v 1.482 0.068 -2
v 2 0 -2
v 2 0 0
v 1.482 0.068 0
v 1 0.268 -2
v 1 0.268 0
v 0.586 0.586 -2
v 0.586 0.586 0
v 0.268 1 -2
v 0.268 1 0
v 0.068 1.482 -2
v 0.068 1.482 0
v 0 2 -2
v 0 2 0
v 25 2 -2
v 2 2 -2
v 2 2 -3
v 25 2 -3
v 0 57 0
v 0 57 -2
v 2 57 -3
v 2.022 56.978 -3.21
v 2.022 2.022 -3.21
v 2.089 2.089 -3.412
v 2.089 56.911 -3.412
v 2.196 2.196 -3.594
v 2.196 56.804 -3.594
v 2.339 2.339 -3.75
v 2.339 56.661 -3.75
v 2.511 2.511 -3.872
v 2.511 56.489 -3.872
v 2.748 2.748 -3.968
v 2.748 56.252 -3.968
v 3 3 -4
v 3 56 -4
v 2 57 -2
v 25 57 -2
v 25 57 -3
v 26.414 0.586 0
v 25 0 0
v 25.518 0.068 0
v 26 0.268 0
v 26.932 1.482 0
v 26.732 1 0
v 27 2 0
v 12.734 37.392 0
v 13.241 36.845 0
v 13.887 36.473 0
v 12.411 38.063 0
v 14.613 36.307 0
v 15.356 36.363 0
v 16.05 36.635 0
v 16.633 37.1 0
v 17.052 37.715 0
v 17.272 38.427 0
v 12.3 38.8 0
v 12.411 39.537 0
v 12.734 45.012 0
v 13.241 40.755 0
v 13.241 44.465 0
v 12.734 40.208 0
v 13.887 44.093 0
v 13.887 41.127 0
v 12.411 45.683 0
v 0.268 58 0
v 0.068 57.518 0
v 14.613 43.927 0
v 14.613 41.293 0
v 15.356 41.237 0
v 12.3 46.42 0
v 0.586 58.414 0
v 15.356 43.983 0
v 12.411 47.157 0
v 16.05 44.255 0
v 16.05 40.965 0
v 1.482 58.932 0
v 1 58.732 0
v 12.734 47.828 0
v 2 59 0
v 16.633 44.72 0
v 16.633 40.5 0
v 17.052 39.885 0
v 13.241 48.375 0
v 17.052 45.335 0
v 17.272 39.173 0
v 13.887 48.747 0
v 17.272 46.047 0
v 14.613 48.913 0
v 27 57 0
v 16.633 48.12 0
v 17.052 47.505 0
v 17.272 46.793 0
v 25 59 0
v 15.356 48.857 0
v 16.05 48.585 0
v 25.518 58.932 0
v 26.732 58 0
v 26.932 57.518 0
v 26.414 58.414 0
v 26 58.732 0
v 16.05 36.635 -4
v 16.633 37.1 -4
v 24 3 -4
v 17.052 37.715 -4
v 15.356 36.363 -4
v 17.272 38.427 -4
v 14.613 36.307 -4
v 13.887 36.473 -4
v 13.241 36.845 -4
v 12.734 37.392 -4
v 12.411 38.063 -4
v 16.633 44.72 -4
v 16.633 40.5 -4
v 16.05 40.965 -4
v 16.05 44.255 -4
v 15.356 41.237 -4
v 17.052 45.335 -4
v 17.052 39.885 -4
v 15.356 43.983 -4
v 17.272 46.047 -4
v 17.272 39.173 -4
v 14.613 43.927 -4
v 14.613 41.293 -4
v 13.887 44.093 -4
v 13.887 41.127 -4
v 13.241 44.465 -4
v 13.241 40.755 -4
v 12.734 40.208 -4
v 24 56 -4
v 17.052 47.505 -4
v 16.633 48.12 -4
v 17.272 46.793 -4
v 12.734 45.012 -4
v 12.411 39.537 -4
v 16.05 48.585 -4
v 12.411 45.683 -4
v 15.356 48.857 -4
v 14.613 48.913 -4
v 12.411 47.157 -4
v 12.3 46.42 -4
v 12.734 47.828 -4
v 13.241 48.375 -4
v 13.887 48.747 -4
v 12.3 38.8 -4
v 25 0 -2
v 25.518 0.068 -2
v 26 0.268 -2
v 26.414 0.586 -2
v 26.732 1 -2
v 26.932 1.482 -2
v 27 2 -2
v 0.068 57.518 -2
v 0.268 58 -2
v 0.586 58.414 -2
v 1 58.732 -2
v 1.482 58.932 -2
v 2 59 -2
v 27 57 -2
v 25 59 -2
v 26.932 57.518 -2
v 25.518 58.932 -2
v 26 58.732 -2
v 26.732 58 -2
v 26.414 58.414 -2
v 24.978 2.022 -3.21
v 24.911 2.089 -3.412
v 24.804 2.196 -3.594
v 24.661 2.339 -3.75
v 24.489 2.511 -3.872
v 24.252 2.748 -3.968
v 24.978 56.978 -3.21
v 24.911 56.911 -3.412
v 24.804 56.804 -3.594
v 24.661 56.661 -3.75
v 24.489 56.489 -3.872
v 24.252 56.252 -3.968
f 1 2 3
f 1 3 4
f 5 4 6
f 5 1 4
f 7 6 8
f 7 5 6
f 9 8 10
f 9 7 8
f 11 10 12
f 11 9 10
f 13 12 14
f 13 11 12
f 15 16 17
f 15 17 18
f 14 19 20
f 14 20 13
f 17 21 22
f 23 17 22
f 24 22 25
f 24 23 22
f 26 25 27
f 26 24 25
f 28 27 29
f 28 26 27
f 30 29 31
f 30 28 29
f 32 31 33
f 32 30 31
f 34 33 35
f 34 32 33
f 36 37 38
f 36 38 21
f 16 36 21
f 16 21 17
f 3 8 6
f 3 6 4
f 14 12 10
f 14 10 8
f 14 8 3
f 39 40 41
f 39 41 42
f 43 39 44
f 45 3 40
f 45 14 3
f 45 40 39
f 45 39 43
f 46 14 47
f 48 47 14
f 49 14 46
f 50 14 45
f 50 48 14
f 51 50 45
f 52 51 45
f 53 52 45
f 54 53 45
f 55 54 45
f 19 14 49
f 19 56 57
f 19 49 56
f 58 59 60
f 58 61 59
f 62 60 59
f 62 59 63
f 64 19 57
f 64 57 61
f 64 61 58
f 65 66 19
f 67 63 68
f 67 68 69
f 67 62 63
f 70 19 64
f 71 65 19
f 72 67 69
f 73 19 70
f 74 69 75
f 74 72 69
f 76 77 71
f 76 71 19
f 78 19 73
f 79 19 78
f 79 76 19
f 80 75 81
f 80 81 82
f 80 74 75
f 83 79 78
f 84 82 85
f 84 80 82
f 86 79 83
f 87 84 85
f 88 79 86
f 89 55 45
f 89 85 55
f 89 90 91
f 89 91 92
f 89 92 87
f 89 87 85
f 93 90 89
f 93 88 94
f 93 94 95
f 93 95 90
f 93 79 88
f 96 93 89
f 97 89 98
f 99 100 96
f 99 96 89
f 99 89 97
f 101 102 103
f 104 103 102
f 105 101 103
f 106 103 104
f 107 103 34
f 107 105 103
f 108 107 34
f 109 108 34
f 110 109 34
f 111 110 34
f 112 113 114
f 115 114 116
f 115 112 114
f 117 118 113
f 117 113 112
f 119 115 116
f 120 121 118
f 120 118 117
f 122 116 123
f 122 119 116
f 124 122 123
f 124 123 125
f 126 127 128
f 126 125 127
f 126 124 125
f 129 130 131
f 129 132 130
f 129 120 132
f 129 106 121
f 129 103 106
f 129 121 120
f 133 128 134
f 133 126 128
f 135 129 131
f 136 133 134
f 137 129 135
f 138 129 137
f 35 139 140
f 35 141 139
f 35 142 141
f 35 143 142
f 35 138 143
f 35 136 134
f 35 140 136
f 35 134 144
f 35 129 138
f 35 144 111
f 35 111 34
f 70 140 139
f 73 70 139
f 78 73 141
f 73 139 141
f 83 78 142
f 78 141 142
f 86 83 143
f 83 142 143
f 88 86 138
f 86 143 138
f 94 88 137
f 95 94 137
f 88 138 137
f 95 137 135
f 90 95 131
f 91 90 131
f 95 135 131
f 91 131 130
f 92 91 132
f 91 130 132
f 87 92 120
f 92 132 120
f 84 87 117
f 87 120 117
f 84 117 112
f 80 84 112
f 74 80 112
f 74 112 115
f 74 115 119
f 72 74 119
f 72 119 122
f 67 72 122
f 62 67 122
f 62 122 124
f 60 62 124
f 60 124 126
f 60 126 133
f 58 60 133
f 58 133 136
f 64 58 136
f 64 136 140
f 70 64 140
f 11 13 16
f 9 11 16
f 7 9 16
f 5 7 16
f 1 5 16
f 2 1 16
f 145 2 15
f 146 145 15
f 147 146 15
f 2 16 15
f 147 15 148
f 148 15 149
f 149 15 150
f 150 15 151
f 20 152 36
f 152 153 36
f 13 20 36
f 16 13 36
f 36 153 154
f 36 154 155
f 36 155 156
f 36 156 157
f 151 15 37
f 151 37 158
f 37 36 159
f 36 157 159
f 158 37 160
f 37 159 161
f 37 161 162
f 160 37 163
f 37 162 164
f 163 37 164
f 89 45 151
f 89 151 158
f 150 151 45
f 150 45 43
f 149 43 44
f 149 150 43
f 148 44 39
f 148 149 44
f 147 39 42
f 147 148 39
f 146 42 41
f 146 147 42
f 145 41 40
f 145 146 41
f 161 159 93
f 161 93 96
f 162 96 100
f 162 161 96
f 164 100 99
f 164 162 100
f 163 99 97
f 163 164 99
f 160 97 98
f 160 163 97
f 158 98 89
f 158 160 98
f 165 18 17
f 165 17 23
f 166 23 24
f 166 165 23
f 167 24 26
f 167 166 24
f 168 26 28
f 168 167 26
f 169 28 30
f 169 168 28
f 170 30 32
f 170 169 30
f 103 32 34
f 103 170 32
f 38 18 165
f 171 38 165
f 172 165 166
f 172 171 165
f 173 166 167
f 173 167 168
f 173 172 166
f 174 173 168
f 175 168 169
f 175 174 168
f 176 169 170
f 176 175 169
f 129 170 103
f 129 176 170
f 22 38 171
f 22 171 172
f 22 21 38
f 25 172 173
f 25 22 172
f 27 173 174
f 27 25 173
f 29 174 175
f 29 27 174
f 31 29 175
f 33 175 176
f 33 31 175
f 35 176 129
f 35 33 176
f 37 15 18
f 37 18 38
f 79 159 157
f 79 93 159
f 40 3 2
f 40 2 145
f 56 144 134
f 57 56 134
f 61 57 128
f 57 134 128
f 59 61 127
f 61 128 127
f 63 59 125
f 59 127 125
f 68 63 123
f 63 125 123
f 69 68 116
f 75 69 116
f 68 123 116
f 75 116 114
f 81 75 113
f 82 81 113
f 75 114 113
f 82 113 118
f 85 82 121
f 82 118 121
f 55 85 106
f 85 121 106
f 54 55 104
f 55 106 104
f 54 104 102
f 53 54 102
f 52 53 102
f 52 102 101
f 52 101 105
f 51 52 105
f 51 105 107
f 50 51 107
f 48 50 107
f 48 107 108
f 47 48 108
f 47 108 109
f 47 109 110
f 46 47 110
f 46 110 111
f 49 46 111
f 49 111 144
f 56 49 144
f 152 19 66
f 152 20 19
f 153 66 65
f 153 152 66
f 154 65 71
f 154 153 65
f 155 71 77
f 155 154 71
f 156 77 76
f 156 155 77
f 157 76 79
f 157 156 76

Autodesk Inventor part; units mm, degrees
ref_plane "YZ Plane" through (0, 0, 0) normal (1, 0, 0) x (0, 1, 0)
ref_plane "XZ Plane" through (0, 0, 0) normal (0, 1, 0) x (-1, 0, 0)
ref_plane "XY Plane" through (0, 0, 0) normal (0, 0, 1) x (1, 0, 0)
sketch "Skizze1" plane through (0, 0, 0) normal (0, 0, 1) x (1, 0, 0)
  line L0 (0, 0) -> (27, 0)
  line L1 (27, 0) -> (27, 59)
  line L2 (27, 59) -> (0, 59)
  line L3 (0, 59) -> (0, 0)
  dimension "d0" = 27
  dimension "d1" = 59
extrude "Extrusion1" add sketch "Skizze1" against normal blind 2
sketch "Skizze2" plane through (0, 0, -2) normal (0, 0, -1) x (-1, 0, 0)
  line L0 (-2, 2) -> (-25, 2)
  line L1 (-25, 2) -> (-25, 57)
  line L2 (-25, 57) -> (-2, 57)
  line L3 (-2, 57) -> (-2, 2)
  line L4 (0, 0) -> (0, 59) construction
  line L5 (-27, 0) -> (0, 0) construction
  point P0 (-2, 29.5)
  point P1 (0, 29.5)
  point P2 (-13.5, 2)
  point P3 (-13.5, 0)
  dimension "d4" = 2
  dimension "d5" = 2
extrude "Extrusion2" add sketch "Skizze2" along normal blind 2
sketch "Skizze3" plane through (0, 0, -4) normal (0, 0, -1) x (-1, 0, 0)
  circle A0 centre (-14.8, 38.8) radius 2.5
  line L0 (-27, 0) -> (0, 0) projected
  line L1 (-2, 2) -> (-2, 57) projected
  line L2 (-25, 57) -> (-25, 2) projected
  circle A1 centre (-14.8, 46.42) radius 2.5
  dimension "d8" = 5
  dimension "d9" = 38.8
  dimension "d11" = 10.2
  dimension "d12" = 5
  dimension "d13" = 7.62
extrude "Extrusion3" cut sketch "Skizze3" against normal through all
fillet "Rundung1" radius 1 4 edges at (13.5, 57, -4) (25, 29.5, -4) (2, 29.5, -4) (13.5, 2, -4)
fillet "Rundung2" radius 2 4 edges at (0, 59, -1) (0, 0, -1) (27, 59, -1) (27, 0, -1)
properties part number "top"
